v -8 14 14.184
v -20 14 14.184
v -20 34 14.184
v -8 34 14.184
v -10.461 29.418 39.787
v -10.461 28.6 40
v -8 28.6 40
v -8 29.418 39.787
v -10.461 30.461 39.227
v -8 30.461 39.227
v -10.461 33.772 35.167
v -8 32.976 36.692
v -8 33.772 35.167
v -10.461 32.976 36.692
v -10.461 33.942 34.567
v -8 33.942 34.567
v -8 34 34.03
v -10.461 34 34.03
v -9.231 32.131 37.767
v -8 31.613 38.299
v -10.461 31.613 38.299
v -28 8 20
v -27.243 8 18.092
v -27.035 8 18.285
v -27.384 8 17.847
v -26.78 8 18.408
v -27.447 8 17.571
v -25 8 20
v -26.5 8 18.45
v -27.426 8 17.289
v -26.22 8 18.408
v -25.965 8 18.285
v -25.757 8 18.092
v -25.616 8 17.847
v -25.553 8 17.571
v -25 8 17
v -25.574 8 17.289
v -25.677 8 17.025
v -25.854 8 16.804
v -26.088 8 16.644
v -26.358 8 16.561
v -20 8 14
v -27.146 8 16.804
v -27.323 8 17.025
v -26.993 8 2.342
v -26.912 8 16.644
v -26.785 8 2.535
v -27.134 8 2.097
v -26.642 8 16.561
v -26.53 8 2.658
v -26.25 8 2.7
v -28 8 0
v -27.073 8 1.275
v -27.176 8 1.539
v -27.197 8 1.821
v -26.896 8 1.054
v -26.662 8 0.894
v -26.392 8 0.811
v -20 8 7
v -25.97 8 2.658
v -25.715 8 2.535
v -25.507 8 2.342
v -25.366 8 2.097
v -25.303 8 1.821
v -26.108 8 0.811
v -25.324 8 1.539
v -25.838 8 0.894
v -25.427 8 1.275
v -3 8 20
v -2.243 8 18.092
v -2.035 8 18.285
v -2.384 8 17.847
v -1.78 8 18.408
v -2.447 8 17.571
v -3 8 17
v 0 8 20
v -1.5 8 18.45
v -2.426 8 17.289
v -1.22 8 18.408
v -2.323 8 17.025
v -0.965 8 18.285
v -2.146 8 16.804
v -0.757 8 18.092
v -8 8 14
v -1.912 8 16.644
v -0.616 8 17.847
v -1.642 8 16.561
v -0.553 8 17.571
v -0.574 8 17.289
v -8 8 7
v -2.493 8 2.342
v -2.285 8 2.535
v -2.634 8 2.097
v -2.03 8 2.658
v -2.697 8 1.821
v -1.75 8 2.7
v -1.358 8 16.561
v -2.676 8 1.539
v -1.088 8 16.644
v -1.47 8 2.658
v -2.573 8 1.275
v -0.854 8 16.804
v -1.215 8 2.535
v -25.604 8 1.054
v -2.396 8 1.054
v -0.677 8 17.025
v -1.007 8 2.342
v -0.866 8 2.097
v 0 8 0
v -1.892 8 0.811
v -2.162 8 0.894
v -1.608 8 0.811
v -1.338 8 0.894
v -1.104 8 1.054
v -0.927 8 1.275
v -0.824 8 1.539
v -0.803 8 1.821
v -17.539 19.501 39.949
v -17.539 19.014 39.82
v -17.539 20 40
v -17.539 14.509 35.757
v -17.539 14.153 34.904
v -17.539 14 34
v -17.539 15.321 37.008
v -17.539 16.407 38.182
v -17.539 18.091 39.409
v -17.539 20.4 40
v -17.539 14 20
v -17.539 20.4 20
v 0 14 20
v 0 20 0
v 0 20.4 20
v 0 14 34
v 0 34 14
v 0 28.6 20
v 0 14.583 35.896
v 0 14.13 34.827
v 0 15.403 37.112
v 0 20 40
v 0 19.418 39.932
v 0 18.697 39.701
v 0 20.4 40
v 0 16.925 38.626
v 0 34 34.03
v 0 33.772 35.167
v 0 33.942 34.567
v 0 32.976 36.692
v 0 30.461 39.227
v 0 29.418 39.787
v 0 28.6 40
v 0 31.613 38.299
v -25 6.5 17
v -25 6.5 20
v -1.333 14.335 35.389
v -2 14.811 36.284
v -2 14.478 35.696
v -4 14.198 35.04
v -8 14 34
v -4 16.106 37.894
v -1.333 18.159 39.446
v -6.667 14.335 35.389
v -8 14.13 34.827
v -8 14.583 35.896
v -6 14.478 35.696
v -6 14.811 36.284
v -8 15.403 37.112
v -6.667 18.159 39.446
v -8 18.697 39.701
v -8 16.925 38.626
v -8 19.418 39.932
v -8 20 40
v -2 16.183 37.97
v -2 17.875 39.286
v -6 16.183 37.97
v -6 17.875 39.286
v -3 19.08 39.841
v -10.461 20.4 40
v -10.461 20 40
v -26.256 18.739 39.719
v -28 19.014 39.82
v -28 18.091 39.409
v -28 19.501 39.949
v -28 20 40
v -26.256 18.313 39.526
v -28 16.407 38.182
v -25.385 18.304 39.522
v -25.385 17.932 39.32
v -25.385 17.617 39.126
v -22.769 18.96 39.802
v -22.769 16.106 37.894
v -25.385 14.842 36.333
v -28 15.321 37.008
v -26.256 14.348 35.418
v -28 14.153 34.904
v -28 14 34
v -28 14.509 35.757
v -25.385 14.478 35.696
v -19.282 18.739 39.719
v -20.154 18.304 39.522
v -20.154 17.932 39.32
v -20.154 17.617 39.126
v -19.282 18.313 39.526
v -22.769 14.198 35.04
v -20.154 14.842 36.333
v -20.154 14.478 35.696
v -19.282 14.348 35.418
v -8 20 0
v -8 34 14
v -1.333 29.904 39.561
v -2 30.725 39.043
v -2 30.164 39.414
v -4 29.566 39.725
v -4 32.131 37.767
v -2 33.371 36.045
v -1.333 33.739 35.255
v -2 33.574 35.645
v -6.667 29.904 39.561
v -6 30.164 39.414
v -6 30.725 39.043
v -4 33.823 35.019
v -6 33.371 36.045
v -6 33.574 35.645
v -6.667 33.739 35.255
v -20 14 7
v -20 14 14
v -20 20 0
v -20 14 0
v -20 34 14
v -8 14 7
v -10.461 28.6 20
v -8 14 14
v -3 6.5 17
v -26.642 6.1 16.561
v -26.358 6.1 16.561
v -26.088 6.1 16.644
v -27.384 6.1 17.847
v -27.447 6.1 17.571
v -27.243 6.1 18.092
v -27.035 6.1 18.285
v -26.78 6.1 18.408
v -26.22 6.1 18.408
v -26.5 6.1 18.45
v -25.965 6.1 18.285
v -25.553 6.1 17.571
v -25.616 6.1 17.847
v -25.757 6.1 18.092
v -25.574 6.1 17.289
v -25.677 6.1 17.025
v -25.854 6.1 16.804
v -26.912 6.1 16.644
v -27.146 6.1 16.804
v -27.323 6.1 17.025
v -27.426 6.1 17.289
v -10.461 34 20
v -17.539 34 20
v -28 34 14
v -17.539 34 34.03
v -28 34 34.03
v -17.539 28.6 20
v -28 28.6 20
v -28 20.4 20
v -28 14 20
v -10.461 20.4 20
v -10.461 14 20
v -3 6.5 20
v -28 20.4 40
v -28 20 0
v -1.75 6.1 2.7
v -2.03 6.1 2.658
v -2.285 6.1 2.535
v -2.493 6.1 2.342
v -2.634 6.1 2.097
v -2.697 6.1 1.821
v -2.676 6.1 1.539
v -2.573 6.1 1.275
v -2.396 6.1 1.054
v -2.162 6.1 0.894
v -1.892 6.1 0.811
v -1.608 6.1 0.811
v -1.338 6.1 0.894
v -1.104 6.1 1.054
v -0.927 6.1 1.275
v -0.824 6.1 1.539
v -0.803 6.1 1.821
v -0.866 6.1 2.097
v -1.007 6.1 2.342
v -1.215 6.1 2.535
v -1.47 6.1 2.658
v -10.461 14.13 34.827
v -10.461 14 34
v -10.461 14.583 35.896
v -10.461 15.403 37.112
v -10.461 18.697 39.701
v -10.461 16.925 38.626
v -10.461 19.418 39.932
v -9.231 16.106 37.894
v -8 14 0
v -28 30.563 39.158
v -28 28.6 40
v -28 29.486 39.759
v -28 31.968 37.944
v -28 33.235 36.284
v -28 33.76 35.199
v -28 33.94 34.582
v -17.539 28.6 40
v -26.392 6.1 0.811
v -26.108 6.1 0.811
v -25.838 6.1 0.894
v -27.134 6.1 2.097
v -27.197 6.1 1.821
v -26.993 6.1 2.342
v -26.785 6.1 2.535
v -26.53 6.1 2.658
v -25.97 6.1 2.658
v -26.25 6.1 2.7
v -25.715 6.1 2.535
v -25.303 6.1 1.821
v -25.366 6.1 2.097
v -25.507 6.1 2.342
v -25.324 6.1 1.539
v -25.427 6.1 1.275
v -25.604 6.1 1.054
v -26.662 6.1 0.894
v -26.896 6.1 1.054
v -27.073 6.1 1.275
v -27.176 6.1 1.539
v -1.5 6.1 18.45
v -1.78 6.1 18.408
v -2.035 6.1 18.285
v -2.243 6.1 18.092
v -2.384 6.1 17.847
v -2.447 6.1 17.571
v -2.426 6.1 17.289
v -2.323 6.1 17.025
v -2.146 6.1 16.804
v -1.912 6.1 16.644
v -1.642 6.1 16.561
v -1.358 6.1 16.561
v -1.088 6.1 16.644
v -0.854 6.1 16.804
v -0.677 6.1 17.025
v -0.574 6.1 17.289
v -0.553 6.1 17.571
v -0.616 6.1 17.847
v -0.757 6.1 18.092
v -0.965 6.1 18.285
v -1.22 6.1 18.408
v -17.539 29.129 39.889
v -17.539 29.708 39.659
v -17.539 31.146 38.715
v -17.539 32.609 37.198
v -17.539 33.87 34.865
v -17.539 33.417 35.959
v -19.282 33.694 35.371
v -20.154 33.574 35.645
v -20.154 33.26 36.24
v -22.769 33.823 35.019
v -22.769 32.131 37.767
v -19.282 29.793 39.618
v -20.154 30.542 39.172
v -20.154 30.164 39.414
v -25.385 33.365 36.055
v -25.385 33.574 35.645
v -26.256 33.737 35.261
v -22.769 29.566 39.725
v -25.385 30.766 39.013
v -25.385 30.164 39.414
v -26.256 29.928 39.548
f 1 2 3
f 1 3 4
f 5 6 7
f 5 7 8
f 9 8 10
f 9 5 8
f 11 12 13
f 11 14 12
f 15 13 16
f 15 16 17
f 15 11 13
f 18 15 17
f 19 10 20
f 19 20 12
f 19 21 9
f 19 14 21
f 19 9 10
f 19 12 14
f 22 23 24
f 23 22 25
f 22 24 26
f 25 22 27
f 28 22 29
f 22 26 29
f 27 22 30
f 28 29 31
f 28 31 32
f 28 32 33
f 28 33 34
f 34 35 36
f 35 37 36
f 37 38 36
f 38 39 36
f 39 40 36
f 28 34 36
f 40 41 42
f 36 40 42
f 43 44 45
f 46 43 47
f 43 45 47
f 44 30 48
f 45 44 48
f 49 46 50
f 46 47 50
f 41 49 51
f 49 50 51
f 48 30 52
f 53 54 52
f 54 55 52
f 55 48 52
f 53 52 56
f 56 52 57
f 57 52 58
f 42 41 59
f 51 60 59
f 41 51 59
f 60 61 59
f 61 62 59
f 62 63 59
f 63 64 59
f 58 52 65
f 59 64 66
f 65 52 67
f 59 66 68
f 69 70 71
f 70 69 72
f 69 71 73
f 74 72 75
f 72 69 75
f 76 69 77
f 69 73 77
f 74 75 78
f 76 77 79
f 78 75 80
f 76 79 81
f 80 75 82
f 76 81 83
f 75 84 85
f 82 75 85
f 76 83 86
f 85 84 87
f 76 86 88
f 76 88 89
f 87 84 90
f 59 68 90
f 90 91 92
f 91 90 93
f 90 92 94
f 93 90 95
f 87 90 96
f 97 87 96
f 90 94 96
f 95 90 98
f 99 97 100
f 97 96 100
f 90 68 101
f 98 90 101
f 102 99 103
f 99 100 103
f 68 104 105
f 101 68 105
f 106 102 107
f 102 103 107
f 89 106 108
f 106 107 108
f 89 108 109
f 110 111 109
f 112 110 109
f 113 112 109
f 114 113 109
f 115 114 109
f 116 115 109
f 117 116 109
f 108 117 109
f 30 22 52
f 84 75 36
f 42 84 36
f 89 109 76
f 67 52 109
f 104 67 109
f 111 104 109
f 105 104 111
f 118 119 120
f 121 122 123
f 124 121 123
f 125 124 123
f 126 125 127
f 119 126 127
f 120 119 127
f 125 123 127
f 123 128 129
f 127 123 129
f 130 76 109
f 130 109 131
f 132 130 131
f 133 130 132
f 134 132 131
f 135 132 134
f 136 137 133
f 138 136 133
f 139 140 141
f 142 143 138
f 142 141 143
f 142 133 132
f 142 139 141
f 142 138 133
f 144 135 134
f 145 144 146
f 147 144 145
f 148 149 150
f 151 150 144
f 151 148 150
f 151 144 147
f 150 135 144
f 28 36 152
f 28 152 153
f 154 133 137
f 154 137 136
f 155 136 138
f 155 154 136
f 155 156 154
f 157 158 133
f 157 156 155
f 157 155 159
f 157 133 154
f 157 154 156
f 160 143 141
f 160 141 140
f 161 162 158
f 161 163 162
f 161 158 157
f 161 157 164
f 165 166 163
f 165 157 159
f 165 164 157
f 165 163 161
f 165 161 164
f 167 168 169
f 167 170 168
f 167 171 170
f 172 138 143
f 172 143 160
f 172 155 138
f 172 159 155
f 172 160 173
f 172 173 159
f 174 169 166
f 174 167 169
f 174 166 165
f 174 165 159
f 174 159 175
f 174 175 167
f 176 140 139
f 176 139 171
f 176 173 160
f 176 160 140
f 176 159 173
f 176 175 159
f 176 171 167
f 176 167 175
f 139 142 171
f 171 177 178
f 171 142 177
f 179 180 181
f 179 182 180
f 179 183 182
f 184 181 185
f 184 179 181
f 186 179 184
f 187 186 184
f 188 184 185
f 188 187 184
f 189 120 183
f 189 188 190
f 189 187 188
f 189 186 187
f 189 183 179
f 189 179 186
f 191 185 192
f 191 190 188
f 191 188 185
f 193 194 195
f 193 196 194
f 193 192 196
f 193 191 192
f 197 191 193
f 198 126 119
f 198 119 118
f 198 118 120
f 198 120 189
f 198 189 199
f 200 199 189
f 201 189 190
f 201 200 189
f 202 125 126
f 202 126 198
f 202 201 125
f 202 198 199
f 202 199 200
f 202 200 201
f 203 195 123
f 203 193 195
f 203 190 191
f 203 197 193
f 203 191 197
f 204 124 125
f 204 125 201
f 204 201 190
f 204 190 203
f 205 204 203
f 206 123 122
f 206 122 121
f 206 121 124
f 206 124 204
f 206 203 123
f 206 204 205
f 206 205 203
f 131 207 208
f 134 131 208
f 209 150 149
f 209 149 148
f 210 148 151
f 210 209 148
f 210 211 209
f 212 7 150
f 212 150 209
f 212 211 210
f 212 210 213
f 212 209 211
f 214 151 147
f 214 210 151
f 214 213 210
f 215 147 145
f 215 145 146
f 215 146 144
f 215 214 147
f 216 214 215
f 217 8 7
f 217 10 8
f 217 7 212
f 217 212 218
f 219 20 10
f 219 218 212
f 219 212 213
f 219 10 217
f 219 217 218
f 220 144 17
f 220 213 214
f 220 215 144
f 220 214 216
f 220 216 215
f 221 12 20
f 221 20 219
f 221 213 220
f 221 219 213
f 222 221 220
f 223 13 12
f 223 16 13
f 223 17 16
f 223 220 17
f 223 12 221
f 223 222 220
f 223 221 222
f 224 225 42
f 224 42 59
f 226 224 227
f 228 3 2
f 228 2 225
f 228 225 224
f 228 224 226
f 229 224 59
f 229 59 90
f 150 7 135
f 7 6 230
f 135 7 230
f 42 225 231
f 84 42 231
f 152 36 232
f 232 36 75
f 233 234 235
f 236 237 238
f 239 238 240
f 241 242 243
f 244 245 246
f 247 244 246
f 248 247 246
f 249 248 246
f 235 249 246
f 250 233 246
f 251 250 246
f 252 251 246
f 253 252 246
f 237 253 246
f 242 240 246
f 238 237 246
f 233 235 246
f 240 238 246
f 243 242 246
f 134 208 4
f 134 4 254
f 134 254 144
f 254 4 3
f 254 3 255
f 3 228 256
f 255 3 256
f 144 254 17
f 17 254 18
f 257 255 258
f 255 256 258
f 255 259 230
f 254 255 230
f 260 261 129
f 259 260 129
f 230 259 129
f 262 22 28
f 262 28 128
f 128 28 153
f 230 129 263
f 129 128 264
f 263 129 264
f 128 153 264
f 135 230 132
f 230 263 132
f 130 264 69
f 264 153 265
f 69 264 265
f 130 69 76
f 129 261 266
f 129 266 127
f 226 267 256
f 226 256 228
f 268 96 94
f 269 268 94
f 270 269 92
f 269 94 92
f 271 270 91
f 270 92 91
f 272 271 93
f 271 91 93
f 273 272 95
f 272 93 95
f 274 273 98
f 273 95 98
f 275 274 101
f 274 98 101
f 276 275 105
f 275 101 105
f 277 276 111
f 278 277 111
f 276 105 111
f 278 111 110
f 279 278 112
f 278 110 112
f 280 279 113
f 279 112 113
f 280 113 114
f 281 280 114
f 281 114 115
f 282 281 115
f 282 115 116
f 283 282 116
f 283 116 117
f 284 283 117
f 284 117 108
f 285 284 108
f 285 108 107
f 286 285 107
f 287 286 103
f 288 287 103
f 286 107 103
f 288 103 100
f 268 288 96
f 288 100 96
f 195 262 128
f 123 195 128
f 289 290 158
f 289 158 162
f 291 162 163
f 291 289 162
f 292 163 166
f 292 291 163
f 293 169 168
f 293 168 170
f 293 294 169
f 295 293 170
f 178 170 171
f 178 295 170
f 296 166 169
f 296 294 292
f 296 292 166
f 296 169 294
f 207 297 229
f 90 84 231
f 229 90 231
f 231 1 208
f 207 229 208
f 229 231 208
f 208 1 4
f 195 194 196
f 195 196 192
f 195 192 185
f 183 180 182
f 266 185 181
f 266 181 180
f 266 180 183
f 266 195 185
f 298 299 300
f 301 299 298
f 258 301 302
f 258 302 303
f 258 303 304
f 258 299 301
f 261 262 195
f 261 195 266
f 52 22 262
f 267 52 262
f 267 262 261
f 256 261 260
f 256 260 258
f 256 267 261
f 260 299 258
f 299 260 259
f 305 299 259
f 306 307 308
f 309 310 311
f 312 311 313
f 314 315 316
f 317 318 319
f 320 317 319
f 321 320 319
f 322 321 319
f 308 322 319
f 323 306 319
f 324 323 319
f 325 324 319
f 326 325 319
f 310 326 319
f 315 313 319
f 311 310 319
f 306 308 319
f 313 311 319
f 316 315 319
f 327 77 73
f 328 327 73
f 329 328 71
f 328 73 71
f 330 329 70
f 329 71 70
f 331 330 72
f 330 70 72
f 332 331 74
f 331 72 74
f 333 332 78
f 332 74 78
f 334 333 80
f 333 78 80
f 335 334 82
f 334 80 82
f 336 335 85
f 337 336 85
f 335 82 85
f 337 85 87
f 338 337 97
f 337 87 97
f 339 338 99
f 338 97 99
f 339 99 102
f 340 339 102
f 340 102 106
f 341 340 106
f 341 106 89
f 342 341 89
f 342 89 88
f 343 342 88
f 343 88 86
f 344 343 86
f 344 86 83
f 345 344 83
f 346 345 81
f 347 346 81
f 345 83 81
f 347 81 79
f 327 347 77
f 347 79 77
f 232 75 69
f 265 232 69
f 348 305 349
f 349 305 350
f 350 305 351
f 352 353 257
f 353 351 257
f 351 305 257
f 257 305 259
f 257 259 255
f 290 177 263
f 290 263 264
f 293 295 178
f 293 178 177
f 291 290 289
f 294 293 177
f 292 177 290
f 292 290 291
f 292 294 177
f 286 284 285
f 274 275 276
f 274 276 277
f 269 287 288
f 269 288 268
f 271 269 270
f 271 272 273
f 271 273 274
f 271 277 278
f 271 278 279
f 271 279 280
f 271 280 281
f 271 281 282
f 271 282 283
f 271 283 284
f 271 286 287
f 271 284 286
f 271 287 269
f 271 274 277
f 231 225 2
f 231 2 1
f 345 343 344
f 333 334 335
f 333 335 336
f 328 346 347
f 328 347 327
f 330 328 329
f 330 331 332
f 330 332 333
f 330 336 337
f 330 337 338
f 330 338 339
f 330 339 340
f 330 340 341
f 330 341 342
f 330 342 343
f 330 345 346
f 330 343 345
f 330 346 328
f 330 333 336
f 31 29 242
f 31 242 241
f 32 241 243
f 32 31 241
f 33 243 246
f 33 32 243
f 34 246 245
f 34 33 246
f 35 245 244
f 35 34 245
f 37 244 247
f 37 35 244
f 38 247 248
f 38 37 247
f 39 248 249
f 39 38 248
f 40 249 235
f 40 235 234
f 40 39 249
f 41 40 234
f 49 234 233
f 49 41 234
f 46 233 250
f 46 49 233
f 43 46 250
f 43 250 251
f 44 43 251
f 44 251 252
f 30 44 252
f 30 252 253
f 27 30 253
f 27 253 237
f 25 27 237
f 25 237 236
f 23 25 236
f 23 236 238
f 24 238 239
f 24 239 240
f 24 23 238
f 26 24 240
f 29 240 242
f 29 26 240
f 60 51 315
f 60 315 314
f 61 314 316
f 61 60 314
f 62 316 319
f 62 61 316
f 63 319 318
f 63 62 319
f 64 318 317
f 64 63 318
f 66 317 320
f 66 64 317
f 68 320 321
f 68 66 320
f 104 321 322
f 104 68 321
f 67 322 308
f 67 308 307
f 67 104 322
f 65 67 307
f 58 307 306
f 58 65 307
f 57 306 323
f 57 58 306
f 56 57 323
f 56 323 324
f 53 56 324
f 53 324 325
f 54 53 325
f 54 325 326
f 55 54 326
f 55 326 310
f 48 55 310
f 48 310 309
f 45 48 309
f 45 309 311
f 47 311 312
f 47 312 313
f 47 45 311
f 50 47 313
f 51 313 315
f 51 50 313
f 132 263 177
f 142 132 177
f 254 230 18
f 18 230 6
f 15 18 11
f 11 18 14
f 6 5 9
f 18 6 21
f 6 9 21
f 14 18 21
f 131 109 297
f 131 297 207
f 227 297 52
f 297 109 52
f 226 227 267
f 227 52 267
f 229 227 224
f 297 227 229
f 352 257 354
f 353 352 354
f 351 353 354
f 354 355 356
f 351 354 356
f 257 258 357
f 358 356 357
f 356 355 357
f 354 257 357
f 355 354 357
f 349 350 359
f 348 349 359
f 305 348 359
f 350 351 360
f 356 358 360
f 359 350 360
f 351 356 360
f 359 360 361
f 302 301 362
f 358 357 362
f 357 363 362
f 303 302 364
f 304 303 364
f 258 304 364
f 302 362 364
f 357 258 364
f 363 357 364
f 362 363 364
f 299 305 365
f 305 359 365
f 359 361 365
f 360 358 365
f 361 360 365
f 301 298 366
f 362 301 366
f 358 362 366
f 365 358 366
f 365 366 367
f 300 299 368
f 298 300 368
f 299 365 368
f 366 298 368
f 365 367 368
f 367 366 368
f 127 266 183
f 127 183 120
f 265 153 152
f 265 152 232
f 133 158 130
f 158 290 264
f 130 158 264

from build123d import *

# Parameters (mm, degrees)
ESQUISSE1_W             = 28
ESQUISSE1_H             = 20
BOSS_EXTRU_1_DEPTH      = 6
ESQUISSE3_W             = 12
ESQUISSE3_H             = 7
ENL_V_MAT_EXTRU_1_DEPTH = 35.928498393
ESQUISSE4_W             = 22
ESQUISSE4_H             = 3
BOSS_EXTRU_2_DEPTH      = 1.5
ESQUISSE5_R             = 0.95
BOSS_EXTRU_3_DEPTH      = 1.9
ESQUISSE6_R             = 0.95
BOSS_EXTRU_4_DEPTH      = 1.9
ESQUISSE12_W            = 28
ESQUISSE12_H            = 5.816034141
BOSS_EXTRU_5_DEPTH      = 20
ESQUISSE13_W            = 8
ESQUISSE13_H            = 14.813855777
BOSS_EXTRU_7_DEPTH      = 20
CHANFREIN4_SIZE         = 14
ESQUISSE15_W            = 10.461102818
ESQUISSE15_H            = 20
BOSS_EXTRU_8_DEPTH      = 20
ESQUISSE16_W            = 10.461102818
ESQUISSE16_H            = 8.2
ENL_V_MAT_EXTRU_2_DEPTH = 20
CONG_3_SIZE             = 6
CONG_4_START            = -29
CONG_4_DEPTH            = 11.461102818
SYM_TRIE3_START         = -8
SYM_TRIE3_DEPTH         = 8
SYM_TRIE3_START_2       = -10.461102818
SYM_TRIE3_2_DEPTH       = 2.461102818


with BuildPart() as part:
    # Esquisse1 → Boss.-Extru.1 (new body)
    with BuildSketch(Plane(origin=(0, 8, 0), x_dir=(1, 0, 0), z_dir=(0, 1, 0))):
        with Locations((-14, -10)):
            Rectangle(ESQUISSE1_W, ESQUISSE1_H)
    extrude(amount=BOSS_EXTRU_1_DEPTH)

    # Esquisse3 → Enlèv. mat.-Extru.1 (cut, through all)
    with BuildSketch(Plane(origin=(0, 14, 0), x_dir=(1, 0, 0), z_dir=(0, 1, 0))):
        with Locations((-14, -10.5)):
            Rectangle(ESQUISSE3_W, ESQUISSE3_H)
    extrude(amount=-ENL_V_MAT_EXTRU_1_DEPTH, mode=Mode.SUBTRACT)

    # Esquisse4 → Boss.-Extru.2 (add)
    with BuildSketch(Plane.XZ.offset(-8)):
        with Locations((-14, 18.5)):
            Rectangle(ESQUISSE4_W, ESQUISSE4_H)
    extrude(amount=BOSS_EXTRU_2_DEPTH)

    # Esquisse5 → Boss.-Extru.3 (add)
    with BuildSketch(Plane.XZ.offset(-8)):
        with Locations(Location((-1.75, 1.75, 0), (0, 0, 90))):
            Circle(ESQUISSE5_R)
    boss_extru_3 = extrude(amount=BOSS_EXTRU_3_DEPTH)

    # Esquisse6 → Boss.-Extru.4 (add)
    with BuildSketch(Plane.XZ.offset(-8)):
        with Locations(Location((-1.5, 17.5, 0), (0, 0, 90))):
            Circle(ESQUISSE6_R)
    boss_extru_4 = extrude(amount=BOSS_EXTRU_4_DEPTH)

    # Symétrie2: Boss.-Extru.3, Boss.-Extru.4 across plane
    add(boss_extru_3.mirror(Plane(origin=(-14, 0, 0), x_dir=(0, 0, 1), z_dir=(1, 0, 0))))
    add(boss_extru_4.mirror(Plane(origin=(-14, 0, 0), x_dir=(0, 0, 1), z_dir=(1, 0, 0))))

    # Esquisse12 → Boss.-Extru.5 (add)
    with BuildSketch(Plane(origin=(0, 14, 0), x_dir=(1, 0, 0), z_dir=(0, 1, 0))):
        with Locations((-14, -17.091982929)):
            Rectangle(ESQUISSE12_W, ESQUISSE12_H)
    extrude(amount=BOSS_EXTRU_5_DEPTH)

    # Esquisse13 → Boss.-Extru.7 (add)
    with BuildSketch(Plane(origin=(0, 14, 0), x_dir=(1, 0, 0), z_dir=(0, 1, 0))):
        with Locations((-24, -7.406927889)):
            Rectangle(ESQUISSE13_W, ESQUISSE13_H)
    extrude(amount=BOSS_EXTRU_7_DEPTH)

    # Chanfrein4
    chanfrein4_edges = [part.edges().sort_by_distance(p)[0] for p in [
        (-24, 34, 0),
    ]]
    chamfer(chanfrein4_edges, length=CHANFREIN4_SIZE)

    # Esquisse15 → Boss.-Extru.8 (add)
    with BuildSketch(Plane.XY.offset(20)):
        with Locations((-22.769448591, 24)):
            Rectangle(ESQUISSE15_W, ESQUISSE15_H)
    extrude(amount=BOSS_EXTRU_8_DEPTH)

    # Esquisse16 → Enlèv. mat.-Extru.2 (cut)
    with BuildSketch(Plane.XY.offset(40)):
        with Locations((-22.769448591, 24.5)):
            Rectangle(ESQUISSE16_W, ESQUISSE16_H)
    extrude(amount=-ENL_V_MAT_EXTRU_2_DEPTH, mode=Mode.SUBTRACT)

    # Congé3
    # a fillet whose section is not a circle: 6 mm, written as the material it takes off along each edge
    with BuildSketch(Plane(origin=(-2.538897182, 14, 40), x_dir=(0, 1, 0), z_dir=(-1, 0, 0))) as cong_3_piece_1:
        with BuildLine():
            Bezier((CONG_3_SIZE, 0), (0, 0), (0, CONG_3_SIZE), weights=[1, 0.424264069, 1])
            Line((0, CONG_3_SIZE), (0, 0))
            Line((0, 0), (CONG_3_SIZE, 0))
        make_face()
    extrude(amount=40.461102818, mode=Mode.SUBTRACT)

    # Congé4: read off the stored shape, not the designer's step
    # Congé4 outline → Congé4 (cut)
    with BuildSketch(Plane.YZ.offset(CONG_4_START)):
        with BuildLine():
            add(Edge.make_bspline(
                [(34, 34.030075377), (34, 39.45727958), (28.6, 40)],
                knots=[0, 0, 0, 1, 1, 1], degree=2, weights=[1, 0.444971909, 1]))
            Line((34, 34.030075377), (34, 40))
            Line((34, 40), (28.6, 40))
        make_face()
    extrude(amount=CONG_4_DEPTH, mode=Mode.SUBTRACT)

    # Symétrie3: read off the stored shape, not the designer's step
    # Symétrie3 outline → Symétrie3 (add)
    with BuildSketch(Plane.YZ.offset(SYM_TRIE3_START)):
        Polygon((34, 14), (34, 14.183965859), (14, 14.183965859), (14, 0), (20, 0), align=None)
        with BuildLine():
            Line((28.6, 40), (28.6, 20))
            Line((28.6, 20), (34, 20))
            Line((34, 20), (34, 34.030075377))
            add(Edge.make_bspline(
                [(28.6, 40), (34, 39.45727958), (34, 34.030075377)],
                knots=[0, 0, 0, 1, 1, 1], degree=2, weights=[1, 0.444971909, 1]))
        make_face()
        with BuildLine():
            add(Edge.make_bspline(
                [(14, 34), (14, 40), (20, 40)],
                knots=[0, 0, 0, 1, 1, 1], degree=2, weights=[1, 0.424264069, 1]))
            Line((14, 34), (14, 20))
            Line((14, 20), (20.4, 20))
            Line((20.4, 20), (20.4, 40))
            Line((20.4, 40), (20, 40))
        make_face()
    extrude(amount=SYM_TRIE3_DEPTH)

    # Sym_trie3 2 outline → Sym_trie3 2 (add)
    with BuildSketch(Plane.YZ.offset(SYM_TRIE3_START_2)):
        with BuildLine():
            Line((28.6, 40), (28.6, 20))
            Line((28.6, 20), (34, 20))
            Line((34, 20), (34, 34.030075377))
            add(Edge.make_bspline(
                [(28.6, 40), (34, 39.45727958), (34, 34.030075377)],
                knots=[0, 0, 0, 1, 1, 1], degree=2, weights=[1, 0.444971909, 1]))
        make_face()
        with BuildLine():
            add(Edge.make_bspline(
                [(14, 34), (14, 40), (20, 40)],
                knots=[0, 0, 0, 1, 1, 1], degree=2, weights=[1, 0.424264069, 1]))
            Line((14, 34), (14, 20))
            Line((14, 20), (20.4, 20))
            Line((20.4, 20), (20.4, 40))
            Line((20.4, 40), (20, 40))
        make_face()
    extrude(amount=SYM_TRIE3_2_DEPTH)


solid = part.part
